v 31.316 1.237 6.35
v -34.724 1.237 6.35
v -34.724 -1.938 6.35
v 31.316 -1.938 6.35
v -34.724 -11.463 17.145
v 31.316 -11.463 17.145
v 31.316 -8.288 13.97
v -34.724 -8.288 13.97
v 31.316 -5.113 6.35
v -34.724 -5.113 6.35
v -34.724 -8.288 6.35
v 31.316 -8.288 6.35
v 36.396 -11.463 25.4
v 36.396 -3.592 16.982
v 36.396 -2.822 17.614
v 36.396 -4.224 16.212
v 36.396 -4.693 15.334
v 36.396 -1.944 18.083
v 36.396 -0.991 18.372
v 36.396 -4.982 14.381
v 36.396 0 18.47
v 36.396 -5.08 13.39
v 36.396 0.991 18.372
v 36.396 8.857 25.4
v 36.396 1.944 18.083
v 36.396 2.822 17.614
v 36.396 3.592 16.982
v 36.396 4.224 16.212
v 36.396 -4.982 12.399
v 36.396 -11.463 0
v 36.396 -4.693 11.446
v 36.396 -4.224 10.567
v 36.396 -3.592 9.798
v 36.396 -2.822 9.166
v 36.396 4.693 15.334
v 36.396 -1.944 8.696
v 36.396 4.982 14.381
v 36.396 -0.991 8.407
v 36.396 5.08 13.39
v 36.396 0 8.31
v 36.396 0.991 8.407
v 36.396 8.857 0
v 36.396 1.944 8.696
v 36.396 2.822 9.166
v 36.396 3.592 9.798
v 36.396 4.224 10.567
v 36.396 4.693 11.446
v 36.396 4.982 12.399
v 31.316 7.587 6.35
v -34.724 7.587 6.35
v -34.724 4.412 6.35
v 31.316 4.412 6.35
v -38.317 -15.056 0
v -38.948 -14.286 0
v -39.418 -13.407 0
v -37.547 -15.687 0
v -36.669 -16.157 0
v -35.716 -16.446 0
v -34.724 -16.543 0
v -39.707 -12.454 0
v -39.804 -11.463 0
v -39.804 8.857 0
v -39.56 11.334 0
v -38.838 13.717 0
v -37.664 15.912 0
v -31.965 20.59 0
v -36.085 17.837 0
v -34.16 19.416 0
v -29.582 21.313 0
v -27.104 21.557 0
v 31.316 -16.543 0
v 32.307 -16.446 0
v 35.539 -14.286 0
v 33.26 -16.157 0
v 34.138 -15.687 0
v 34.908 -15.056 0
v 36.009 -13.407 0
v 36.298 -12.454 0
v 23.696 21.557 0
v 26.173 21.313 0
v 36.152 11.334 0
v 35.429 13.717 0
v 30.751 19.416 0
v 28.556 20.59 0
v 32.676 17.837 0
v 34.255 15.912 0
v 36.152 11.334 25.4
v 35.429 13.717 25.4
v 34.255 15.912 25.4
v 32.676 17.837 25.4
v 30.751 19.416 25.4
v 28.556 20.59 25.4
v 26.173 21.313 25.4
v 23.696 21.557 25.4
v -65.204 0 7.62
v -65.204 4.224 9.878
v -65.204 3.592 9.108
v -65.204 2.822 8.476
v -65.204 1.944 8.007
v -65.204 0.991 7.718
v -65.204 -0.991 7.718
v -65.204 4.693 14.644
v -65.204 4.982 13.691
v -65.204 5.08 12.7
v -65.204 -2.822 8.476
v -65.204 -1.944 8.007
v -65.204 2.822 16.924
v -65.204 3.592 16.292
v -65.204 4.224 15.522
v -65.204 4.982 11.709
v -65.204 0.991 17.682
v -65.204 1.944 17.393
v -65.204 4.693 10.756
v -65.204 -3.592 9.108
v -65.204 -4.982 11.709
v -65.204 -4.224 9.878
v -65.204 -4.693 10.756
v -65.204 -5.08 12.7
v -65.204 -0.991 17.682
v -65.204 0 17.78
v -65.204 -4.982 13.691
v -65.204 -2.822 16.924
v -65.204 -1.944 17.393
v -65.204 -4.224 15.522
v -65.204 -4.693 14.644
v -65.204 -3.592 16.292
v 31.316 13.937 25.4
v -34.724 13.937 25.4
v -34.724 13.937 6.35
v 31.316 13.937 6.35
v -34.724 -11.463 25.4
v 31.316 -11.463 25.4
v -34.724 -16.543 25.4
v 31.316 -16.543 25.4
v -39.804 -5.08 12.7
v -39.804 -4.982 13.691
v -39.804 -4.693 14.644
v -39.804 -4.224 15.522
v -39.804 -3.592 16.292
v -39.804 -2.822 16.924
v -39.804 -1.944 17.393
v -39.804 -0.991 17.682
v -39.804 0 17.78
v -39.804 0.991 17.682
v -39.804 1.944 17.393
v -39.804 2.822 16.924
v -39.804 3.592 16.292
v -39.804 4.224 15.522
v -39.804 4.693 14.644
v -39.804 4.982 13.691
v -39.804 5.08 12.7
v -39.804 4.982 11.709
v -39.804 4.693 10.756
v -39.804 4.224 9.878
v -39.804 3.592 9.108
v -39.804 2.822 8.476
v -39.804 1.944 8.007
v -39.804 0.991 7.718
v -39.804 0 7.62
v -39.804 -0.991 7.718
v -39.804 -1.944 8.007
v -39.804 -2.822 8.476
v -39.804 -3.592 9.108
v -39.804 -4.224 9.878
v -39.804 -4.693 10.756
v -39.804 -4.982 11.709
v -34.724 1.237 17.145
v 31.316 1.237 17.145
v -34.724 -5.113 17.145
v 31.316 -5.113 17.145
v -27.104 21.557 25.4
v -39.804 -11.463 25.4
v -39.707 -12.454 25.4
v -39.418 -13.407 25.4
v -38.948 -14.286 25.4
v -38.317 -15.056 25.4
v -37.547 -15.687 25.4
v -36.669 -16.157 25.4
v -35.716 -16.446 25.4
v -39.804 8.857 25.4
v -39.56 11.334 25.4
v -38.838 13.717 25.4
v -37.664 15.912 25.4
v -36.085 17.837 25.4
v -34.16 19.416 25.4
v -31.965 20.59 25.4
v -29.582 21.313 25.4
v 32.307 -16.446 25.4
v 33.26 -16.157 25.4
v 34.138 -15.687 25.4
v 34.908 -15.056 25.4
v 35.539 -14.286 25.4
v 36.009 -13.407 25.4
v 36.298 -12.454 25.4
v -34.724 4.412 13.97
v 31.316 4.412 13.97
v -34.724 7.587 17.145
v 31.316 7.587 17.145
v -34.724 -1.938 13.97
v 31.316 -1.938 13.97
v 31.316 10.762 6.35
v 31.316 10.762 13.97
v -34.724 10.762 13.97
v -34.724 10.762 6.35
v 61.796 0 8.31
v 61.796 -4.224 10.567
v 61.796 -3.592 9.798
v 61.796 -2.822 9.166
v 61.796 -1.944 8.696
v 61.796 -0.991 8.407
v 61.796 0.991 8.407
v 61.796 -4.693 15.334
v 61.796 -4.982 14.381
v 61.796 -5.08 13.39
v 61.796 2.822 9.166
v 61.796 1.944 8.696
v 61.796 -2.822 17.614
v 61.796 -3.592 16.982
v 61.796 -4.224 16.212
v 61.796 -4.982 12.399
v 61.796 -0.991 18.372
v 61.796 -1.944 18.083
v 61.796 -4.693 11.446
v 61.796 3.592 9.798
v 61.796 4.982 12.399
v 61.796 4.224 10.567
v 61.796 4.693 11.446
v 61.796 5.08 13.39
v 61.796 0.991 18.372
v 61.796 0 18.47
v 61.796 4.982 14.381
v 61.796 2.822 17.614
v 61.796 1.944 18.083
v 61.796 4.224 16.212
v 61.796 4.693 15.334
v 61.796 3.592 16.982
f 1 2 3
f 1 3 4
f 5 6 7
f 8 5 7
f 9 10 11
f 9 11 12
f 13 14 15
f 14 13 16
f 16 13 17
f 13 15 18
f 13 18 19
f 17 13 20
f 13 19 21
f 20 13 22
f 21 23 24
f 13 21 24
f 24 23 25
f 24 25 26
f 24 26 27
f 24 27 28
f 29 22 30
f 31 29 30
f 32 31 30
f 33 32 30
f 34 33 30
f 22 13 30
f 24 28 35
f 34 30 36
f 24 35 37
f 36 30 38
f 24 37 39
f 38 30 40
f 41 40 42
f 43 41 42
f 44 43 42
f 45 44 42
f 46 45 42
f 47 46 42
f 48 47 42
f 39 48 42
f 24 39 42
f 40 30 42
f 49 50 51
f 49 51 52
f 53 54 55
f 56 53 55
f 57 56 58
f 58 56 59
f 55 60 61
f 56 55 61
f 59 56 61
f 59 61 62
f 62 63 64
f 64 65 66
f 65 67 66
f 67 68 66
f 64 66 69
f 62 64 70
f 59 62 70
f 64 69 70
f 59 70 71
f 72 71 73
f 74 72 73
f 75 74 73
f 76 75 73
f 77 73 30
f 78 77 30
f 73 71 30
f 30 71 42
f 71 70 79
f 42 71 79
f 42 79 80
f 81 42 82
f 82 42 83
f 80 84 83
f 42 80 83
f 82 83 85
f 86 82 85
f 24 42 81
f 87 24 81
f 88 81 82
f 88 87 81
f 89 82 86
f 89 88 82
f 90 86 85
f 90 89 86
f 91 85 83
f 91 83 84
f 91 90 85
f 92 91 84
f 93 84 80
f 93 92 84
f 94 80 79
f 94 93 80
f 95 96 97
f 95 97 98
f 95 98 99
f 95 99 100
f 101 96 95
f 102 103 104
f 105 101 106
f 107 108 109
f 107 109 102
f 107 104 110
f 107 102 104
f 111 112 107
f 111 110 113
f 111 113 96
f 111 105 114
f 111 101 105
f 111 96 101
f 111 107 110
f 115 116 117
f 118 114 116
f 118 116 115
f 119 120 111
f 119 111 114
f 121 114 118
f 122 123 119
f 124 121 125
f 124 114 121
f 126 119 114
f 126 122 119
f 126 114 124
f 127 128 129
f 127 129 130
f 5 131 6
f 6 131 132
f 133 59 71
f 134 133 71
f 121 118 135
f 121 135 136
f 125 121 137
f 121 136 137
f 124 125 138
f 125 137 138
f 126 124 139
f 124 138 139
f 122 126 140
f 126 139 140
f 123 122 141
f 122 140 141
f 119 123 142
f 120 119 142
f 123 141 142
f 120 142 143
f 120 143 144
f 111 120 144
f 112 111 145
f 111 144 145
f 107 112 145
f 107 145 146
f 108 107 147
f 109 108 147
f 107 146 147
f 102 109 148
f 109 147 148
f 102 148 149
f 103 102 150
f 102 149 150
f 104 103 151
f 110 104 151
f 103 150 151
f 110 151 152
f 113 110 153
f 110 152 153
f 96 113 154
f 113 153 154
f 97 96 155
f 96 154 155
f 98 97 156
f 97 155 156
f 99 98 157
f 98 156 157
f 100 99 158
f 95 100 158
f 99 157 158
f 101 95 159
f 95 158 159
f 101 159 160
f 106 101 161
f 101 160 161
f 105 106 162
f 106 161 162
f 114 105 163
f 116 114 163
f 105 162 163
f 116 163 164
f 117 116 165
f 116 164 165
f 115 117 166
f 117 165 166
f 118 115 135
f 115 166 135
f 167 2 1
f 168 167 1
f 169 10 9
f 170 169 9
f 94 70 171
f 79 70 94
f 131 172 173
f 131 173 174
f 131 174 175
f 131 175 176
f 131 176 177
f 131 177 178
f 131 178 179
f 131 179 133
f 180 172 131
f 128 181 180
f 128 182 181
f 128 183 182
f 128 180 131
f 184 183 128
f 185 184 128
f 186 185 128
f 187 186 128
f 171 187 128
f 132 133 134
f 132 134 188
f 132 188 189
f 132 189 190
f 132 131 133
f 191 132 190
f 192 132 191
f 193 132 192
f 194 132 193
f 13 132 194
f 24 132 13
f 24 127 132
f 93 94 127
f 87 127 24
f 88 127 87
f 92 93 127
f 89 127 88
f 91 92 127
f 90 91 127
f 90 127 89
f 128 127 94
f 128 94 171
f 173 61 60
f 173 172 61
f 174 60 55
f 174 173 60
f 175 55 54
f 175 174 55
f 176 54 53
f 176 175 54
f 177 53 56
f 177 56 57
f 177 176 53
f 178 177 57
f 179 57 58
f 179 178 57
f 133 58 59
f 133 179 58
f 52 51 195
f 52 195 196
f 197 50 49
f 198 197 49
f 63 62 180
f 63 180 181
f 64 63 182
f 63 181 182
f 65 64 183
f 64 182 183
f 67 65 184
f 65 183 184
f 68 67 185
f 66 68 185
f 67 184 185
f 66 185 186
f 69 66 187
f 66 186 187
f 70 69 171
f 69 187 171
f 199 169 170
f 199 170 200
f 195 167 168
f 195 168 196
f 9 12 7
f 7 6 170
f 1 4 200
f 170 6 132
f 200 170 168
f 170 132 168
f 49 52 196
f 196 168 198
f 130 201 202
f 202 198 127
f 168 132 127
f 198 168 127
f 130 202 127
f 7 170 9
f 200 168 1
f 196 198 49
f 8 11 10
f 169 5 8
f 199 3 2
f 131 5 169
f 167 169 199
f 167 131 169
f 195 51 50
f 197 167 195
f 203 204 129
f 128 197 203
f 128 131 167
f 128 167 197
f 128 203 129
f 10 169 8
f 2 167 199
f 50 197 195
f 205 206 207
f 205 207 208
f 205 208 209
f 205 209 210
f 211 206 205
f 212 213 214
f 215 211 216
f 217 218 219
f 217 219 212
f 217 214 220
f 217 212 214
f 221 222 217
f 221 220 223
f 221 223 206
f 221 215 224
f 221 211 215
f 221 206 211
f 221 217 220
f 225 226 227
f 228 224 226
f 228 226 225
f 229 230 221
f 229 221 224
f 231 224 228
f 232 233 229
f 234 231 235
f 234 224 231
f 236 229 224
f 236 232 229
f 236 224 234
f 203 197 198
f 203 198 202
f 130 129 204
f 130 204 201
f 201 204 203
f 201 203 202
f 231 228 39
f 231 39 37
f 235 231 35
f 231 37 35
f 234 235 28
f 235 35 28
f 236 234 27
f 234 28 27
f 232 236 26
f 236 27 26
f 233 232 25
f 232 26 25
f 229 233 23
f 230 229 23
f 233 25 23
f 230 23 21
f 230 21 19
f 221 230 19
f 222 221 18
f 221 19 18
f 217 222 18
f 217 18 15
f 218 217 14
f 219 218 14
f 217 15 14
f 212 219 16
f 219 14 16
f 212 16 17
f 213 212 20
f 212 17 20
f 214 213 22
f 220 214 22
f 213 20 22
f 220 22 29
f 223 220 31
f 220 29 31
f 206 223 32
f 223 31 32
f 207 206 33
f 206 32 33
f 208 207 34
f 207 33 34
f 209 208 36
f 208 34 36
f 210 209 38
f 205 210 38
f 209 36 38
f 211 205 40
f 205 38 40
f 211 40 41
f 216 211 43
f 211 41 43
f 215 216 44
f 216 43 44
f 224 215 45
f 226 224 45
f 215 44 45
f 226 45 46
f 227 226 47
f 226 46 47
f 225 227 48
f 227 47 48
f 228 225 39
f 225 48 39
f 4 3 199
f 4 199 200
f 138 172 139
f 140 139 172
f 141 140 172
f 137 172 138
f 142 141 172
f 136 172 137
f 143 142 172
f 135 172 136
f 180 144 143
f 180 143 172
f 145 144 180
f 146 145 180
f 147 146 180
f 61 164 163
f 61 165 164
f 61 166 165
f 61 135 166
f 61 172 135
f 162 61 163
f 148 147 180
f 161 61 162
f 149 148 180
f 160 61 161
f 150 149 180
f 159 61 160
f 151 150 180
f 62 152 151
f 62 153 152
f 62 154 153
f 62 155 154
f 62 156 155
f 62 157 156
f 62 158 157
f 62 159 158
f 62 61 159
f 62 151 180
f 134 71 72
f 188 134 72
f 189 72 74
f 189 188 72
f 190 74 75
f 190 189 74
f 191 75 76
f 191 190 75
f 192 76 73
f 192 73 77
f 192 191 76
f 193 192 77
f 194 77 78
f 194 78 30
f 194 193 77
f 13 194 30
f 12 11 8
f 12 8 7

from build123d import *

# Parameters (mm, degrees)
F0_W         = 76.2
F0_H         = 38.1
F1_DEPTH     = 25.4
F2_R         = 12.7
F3_R         = 5.08
F4_R         = 5.08
F5_DEPTH     = 25.4
F6_R         = 5.08
F7_DEPTH     = 25.4
F8_W         = 66.04
F8_H         = 25.4
F9_DEPTH     = 19.05
F10_W        = 66.04
F10_H        = 3.175
F11_DEPTH    = 12.7
F12_T1_DEPTH = 66.04
F12_T6_DEPTH = 66.04


# Not quite as in the source:
# - a fillet or chamfer that OpenCascade refuses, or shapes differently, is made with other operations: its cross-section is extruded or revolved along the edge and cut away or added


with BuildPart() as f1:
    # F0 (on Top) → F1 (new body)
    with BuildSketch(Plane.XY):
        with Locations((-1.7044725776, 2.5065781057)):
            Rectangle(F0_W, F0_H)
    extrude(amount=F1_DEPTH)

    # F2
    f2_edges = [f1.edges().sort_by_distance(p)[0] for p in [
        (-39.804473, 21.556578, 12.7),
        (36.395527, 21.556578, 12.7),
    ]]
    fillet(f2_edges, radius=F2_R)

    # F3
    f3_edges = [f1.edges().sort_by_distance(p)[0] for p in [
        (-39.804473, -16.543422, 12.7),
        (36.395527, -16.543422, 12.7),
    ]]
    fillet(f3_edges, radius=F3_R)

    # F4 (on face) → F5 (join)
    with BuildSketch(Plane(origin=(-39.8044725776, 0, 0), x_dir=(0, -1, 0), z_dir=(-1, 0, 0))):
        with Locations((0, 12.7)):
            Circle(F4_R)
    extrude(amount=F5_DEPTH)

    # F6 (on face) → F7 (join)
    with BuildSketch(Plane.YZ.offset(36.3955274224)):
        with Locations((0, 13.3897410706)):
            Circle(F6_R)
    extrude(amount=F7_DEPTH)

    # F8 (on face) → F9 (cut)
    with BuildSketch(Plane.XY.offset(25.4)):
        with Locations((-1.7044725776, 1.2365781057)):
            Rectangle(F8_W, F8_H)
    extrude(amount=-F9_DEPTH, mode=Mode.SUBTRACT)

    # F10 (on face) → F11 (join)
    with BuildSketch(Plane.XY.offset(6.35)):
        with Locations((-1.7044725776, 9.1740781057)):
            Rectangle(F10_W, F10_H)
        with Locations((-1.7044725776, 2.8240781057)):
            Rectangle(F10_W, F10_H)
        with Locations((-1.7044725776, -3.5259218943)):
            Rectangle(F10_W, F10_H)
        with Locations((-1.7044725776, -9.8759218943)):
            Rectangle(F10_W, F10_H)
    extrude(amount=F11_DEPTH)

    # F12: chamfer of 5.08 on 4 edges, made by hand

    # F12_s2 → F12_t1 (cut)
    with BuildSketch(Plane.YZ.offset(-34.7244725776)):
        Polygon((5.6815781057, 19.05), (10.7615781057, 13.97), (10.7615781057, 19.05), align=None)
        Polygon((-0.6684218943, 19.05), (4.4115781057, 13.97), (4.4115781057, 19.05), align=None)
        Polygon((-7.0184218943, 19.05), (-1.9384218943, 13.97), (-1.9384218943, 19.05), align=None)
    extrude(amount=F12_T1_DEPTH, mode=Mode.SUBTRACT)


with BuildPart() as f12_tool4:
    # F12_s5 → F12_t6 (new body)
    with BuildSketch(Plane.YZ.offset(31.3155274224)):
        Polygon((-13.3684218943, 19.05), (-8.2884218943, 13.97), (-8.2884218943, 19.05), align=None)
    extrude(amount=-F12_T6_DEPTH)

    split(bisect_by=Plane.XZ.offset(11.4634218943), keep=Keep.BOTTOM)


with BuildPart() as f1_1:
    add(f1.part)

    # F12_t3: cut F12_tool4
    add(f12_tool4.part, mode=Mode.SUBTRACT)


solid = f1_1.part
